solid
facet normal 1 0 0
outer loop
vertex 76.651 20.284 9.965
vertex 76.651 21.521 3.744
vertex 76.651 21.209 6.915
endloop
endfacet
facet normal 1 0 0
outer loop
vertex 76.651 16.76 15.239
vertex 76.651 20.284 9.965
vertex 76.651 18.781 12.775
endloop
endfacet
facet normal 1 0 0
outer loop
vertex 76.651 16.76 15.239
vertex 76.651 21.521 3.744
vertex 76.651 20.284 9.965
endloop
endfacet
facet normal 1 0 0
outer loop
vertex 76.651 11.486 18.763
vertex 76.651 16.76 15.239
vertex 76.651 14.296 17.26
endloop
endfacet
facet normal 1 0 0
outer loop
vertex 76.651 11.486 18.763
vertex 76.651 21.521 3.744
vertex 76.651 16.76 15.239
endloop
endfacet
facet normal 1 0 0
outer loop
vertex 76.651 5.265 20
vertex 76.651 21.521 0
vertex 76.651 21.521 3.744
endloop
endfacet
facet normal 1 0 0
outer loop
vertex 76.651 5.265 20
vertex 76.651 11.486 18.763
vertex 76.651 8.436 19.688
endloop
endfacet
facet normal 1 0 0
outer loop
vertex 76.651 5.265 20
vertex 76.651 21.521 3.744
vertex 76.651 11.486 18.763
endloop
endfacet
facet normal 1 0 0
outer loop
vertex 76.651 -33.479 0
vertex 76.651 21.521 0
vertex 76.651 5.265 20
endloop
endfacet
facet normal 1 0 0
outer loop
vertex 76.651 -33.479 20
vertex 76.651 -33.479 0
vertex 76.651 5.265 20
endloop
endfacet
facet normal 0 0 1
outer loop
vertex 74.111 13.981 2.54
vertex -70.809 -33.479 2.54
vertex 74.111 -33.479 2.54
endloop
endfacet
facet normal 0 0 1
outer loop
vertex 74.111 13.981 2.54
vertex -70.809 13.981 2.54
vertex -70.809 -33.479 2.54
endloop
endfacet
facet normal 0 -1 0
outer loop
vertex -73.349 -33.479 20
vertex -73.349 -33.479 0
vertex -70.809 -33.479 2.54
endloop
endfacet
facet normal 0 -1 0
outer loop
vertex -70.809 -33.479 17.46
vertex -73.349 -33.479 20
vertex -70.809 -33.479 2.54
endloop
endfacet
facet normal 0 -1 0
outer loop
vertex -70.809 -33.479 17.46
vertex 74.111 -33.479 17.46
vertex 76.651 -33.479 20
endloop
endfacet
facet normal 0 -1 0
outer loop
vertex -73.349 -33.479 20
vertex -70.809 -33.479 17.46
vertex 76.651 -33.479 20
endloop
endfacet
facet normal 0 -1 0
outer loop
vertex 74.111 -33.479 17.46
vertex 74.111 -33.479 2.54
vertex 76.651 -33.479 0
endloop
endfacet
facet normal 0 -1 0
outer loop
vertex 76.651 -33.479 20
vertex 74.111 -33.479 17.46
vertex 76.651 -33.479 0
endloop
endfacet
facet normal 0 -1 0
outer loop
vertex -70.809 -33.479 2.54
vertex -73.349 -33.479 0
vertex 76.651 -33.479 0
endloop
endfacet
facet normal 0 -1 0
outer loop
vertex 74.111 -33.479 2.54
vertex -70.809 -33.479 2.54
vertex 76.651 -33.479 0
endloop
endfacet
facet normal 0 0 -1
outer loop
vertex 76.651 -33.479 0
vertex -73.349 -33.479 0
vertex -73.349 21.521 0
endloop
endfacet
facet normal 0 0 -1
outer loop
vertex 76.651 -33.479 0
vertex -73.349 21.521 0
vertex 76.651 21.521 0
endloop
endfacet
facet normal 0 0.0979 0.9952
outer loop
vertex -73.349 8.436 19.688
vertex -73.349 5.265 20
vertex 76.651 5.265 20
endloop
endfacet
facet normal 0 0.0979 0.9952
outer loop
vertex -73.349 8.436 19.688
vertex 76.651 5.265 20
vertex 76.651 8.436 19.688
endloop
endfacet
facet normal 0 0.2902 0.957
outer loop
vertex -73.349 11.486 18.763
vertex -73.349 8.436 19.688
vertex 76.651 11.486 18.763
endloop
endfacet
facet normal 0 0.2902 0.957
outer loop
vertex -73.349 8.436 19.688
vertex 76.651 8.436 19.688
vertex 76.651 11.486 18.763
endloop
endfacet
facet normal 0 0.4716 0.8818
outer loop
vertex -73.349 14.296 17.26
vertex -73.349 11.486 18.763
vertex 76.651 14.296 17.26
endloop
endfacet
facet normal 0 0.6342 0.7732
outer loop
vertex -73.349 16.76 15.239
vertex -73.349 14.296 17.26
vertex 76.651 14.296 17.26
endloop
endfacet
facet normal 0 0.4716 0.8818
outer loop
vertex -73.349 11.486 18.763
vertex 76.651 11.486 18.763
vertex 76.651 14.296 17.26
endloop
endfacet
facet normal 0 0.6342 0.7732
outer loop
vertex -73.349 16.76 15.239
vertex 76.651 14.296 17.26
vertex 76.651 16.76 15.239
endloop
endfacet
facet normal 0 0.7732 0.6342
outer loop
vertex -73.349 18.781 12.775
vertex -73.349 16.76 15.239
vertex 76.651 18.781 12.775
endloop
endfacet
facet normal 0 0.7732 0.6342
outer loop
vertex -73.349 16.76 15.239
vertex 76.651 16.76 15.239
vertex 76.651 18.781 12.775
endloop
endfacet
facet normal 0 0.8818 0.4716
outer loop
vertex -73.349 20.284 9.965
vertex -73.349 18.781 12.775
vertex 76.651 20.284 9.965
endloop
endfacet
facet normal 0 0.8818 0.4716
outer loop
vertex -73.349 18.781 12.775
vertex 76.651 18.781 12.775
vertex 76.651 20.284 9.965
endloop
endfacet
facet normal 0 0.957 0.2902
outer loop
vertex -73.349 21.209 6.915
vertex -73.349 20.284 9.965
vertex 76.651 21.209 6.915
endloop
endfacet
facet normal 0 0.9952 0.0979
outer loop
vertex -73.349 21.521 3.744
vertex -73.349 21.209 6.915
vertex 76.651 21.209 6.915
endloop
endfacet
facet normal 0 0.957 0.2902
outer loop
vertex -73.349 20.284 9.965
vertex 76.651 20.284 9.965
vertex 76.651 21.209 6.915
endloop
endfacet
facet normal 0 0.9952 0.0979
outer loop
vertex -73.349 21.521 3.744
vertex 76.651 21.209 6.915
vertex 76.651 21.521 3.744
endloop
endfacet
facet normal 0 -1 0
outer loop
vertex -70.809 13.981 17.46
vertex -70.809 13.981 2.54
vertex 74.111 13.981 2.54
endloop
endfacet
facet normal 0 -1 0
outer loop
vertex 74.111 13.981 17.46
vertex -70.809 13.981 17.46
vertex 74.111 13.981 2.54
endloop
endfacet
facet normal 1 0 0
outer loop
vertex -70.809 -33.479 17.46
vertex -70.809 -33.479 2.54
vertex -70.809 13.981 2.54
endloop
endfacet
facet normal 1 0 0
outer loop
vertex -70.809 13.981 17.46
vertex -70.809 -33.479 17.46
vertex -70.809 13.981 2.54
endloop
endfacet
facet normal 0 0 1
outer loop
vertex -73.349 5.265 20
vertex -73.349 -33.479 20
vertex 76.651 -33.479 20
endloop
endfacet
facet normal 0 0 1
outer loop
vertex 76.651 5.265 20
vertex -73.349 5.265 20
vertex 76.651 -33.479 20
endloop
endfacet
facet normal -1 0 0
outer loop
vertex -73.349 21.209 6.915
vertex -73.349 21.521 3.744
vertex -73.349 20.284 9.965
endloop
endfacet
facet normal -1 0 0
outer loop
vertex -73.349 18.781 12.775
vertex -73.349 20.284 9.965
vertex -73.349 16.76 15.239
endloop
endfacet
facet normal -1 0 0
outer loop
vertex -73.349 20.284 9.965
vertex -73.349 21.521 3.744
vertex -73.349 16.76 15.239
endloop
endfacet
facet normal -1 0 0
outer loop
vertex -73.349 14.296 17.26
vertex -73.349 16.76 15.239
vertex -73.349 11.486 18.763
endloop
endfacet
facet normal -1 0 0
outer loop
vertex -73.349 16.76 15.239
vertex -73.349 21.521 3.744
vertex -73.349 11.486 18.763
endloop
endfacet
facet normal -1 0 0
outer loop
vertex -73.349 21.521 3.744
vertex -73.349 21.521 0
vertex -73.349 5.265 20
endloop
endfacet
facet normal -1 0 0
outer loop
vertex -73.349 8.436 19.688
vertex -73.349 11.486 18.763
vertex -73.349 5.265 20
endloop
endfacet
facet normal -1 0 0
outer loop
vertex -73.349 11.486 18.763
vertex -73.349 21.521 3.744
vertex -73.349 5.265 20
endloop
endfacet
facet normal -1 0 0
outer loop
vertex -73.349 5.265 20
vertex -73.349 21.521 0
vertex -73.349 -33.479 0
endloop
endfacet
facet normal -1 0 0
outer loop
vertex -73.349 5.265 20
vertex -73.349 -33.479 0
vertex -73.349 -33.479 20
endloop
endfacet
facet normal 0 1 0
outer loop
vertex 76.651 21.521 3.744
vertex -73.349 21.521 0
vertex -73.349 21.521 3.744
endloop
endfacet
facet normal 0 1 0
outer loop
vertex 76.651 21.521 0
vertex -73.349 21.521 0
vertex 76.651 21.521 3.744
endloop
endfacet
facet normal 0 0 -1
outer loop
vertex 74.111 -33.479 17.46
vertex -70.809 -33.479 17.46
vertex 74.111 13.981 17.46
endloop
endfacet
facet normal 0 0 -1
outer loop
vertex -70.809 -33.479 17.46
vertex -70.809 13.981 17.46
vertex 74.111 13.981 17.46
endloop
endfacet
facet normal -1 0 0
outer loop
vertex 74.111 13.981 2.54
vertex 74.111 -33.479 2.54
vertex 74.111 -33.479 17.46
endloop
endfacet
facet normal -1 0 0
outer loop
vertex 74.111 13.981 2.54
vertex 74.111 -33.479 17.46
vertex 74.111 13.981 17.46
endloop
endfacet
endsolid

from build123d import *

# Parameters (mm, degrees)
F0_W     = 150
F0_H     = 50
F1_DEPTH = 20
F2_T     = -2.54
F3_DEPTH = 5
F4_R     = 16.256


with BuildPart() as f1:
    # F0 (on Top) → F1 (new body)
    with BuildSketch(Plane.XY):
        with Locations((1.6509965062, -8.4789711357)):
            Rectangle(F0_W, F0_H)
    extrude(amount=F1_DEPTH)

    # F2
    f2_openings = [f1.faces().sort_by_distance(p)[0] for p in [
        (1.650997, -33.478971, 10),
    ]]
    offset(amount=F2_T, openings=f2_openings)

    # F3 (add): a face of the model
    f3_faces = [f1.faces().sort_by_distance(p)[0] for p in [
        (1.6509965062, 16.5210288643, 10),
    ]]
    extrude(f3_faces, amount=F3_DEPTH)

    # F4
    f4_edges = [f1.edges().sort_by_distance(p)[0] for p in [
        (1.650997, 21.521029, 20),
    ]]
    fillet(f4_edges, radius=F4_R)


solid = f1.part
